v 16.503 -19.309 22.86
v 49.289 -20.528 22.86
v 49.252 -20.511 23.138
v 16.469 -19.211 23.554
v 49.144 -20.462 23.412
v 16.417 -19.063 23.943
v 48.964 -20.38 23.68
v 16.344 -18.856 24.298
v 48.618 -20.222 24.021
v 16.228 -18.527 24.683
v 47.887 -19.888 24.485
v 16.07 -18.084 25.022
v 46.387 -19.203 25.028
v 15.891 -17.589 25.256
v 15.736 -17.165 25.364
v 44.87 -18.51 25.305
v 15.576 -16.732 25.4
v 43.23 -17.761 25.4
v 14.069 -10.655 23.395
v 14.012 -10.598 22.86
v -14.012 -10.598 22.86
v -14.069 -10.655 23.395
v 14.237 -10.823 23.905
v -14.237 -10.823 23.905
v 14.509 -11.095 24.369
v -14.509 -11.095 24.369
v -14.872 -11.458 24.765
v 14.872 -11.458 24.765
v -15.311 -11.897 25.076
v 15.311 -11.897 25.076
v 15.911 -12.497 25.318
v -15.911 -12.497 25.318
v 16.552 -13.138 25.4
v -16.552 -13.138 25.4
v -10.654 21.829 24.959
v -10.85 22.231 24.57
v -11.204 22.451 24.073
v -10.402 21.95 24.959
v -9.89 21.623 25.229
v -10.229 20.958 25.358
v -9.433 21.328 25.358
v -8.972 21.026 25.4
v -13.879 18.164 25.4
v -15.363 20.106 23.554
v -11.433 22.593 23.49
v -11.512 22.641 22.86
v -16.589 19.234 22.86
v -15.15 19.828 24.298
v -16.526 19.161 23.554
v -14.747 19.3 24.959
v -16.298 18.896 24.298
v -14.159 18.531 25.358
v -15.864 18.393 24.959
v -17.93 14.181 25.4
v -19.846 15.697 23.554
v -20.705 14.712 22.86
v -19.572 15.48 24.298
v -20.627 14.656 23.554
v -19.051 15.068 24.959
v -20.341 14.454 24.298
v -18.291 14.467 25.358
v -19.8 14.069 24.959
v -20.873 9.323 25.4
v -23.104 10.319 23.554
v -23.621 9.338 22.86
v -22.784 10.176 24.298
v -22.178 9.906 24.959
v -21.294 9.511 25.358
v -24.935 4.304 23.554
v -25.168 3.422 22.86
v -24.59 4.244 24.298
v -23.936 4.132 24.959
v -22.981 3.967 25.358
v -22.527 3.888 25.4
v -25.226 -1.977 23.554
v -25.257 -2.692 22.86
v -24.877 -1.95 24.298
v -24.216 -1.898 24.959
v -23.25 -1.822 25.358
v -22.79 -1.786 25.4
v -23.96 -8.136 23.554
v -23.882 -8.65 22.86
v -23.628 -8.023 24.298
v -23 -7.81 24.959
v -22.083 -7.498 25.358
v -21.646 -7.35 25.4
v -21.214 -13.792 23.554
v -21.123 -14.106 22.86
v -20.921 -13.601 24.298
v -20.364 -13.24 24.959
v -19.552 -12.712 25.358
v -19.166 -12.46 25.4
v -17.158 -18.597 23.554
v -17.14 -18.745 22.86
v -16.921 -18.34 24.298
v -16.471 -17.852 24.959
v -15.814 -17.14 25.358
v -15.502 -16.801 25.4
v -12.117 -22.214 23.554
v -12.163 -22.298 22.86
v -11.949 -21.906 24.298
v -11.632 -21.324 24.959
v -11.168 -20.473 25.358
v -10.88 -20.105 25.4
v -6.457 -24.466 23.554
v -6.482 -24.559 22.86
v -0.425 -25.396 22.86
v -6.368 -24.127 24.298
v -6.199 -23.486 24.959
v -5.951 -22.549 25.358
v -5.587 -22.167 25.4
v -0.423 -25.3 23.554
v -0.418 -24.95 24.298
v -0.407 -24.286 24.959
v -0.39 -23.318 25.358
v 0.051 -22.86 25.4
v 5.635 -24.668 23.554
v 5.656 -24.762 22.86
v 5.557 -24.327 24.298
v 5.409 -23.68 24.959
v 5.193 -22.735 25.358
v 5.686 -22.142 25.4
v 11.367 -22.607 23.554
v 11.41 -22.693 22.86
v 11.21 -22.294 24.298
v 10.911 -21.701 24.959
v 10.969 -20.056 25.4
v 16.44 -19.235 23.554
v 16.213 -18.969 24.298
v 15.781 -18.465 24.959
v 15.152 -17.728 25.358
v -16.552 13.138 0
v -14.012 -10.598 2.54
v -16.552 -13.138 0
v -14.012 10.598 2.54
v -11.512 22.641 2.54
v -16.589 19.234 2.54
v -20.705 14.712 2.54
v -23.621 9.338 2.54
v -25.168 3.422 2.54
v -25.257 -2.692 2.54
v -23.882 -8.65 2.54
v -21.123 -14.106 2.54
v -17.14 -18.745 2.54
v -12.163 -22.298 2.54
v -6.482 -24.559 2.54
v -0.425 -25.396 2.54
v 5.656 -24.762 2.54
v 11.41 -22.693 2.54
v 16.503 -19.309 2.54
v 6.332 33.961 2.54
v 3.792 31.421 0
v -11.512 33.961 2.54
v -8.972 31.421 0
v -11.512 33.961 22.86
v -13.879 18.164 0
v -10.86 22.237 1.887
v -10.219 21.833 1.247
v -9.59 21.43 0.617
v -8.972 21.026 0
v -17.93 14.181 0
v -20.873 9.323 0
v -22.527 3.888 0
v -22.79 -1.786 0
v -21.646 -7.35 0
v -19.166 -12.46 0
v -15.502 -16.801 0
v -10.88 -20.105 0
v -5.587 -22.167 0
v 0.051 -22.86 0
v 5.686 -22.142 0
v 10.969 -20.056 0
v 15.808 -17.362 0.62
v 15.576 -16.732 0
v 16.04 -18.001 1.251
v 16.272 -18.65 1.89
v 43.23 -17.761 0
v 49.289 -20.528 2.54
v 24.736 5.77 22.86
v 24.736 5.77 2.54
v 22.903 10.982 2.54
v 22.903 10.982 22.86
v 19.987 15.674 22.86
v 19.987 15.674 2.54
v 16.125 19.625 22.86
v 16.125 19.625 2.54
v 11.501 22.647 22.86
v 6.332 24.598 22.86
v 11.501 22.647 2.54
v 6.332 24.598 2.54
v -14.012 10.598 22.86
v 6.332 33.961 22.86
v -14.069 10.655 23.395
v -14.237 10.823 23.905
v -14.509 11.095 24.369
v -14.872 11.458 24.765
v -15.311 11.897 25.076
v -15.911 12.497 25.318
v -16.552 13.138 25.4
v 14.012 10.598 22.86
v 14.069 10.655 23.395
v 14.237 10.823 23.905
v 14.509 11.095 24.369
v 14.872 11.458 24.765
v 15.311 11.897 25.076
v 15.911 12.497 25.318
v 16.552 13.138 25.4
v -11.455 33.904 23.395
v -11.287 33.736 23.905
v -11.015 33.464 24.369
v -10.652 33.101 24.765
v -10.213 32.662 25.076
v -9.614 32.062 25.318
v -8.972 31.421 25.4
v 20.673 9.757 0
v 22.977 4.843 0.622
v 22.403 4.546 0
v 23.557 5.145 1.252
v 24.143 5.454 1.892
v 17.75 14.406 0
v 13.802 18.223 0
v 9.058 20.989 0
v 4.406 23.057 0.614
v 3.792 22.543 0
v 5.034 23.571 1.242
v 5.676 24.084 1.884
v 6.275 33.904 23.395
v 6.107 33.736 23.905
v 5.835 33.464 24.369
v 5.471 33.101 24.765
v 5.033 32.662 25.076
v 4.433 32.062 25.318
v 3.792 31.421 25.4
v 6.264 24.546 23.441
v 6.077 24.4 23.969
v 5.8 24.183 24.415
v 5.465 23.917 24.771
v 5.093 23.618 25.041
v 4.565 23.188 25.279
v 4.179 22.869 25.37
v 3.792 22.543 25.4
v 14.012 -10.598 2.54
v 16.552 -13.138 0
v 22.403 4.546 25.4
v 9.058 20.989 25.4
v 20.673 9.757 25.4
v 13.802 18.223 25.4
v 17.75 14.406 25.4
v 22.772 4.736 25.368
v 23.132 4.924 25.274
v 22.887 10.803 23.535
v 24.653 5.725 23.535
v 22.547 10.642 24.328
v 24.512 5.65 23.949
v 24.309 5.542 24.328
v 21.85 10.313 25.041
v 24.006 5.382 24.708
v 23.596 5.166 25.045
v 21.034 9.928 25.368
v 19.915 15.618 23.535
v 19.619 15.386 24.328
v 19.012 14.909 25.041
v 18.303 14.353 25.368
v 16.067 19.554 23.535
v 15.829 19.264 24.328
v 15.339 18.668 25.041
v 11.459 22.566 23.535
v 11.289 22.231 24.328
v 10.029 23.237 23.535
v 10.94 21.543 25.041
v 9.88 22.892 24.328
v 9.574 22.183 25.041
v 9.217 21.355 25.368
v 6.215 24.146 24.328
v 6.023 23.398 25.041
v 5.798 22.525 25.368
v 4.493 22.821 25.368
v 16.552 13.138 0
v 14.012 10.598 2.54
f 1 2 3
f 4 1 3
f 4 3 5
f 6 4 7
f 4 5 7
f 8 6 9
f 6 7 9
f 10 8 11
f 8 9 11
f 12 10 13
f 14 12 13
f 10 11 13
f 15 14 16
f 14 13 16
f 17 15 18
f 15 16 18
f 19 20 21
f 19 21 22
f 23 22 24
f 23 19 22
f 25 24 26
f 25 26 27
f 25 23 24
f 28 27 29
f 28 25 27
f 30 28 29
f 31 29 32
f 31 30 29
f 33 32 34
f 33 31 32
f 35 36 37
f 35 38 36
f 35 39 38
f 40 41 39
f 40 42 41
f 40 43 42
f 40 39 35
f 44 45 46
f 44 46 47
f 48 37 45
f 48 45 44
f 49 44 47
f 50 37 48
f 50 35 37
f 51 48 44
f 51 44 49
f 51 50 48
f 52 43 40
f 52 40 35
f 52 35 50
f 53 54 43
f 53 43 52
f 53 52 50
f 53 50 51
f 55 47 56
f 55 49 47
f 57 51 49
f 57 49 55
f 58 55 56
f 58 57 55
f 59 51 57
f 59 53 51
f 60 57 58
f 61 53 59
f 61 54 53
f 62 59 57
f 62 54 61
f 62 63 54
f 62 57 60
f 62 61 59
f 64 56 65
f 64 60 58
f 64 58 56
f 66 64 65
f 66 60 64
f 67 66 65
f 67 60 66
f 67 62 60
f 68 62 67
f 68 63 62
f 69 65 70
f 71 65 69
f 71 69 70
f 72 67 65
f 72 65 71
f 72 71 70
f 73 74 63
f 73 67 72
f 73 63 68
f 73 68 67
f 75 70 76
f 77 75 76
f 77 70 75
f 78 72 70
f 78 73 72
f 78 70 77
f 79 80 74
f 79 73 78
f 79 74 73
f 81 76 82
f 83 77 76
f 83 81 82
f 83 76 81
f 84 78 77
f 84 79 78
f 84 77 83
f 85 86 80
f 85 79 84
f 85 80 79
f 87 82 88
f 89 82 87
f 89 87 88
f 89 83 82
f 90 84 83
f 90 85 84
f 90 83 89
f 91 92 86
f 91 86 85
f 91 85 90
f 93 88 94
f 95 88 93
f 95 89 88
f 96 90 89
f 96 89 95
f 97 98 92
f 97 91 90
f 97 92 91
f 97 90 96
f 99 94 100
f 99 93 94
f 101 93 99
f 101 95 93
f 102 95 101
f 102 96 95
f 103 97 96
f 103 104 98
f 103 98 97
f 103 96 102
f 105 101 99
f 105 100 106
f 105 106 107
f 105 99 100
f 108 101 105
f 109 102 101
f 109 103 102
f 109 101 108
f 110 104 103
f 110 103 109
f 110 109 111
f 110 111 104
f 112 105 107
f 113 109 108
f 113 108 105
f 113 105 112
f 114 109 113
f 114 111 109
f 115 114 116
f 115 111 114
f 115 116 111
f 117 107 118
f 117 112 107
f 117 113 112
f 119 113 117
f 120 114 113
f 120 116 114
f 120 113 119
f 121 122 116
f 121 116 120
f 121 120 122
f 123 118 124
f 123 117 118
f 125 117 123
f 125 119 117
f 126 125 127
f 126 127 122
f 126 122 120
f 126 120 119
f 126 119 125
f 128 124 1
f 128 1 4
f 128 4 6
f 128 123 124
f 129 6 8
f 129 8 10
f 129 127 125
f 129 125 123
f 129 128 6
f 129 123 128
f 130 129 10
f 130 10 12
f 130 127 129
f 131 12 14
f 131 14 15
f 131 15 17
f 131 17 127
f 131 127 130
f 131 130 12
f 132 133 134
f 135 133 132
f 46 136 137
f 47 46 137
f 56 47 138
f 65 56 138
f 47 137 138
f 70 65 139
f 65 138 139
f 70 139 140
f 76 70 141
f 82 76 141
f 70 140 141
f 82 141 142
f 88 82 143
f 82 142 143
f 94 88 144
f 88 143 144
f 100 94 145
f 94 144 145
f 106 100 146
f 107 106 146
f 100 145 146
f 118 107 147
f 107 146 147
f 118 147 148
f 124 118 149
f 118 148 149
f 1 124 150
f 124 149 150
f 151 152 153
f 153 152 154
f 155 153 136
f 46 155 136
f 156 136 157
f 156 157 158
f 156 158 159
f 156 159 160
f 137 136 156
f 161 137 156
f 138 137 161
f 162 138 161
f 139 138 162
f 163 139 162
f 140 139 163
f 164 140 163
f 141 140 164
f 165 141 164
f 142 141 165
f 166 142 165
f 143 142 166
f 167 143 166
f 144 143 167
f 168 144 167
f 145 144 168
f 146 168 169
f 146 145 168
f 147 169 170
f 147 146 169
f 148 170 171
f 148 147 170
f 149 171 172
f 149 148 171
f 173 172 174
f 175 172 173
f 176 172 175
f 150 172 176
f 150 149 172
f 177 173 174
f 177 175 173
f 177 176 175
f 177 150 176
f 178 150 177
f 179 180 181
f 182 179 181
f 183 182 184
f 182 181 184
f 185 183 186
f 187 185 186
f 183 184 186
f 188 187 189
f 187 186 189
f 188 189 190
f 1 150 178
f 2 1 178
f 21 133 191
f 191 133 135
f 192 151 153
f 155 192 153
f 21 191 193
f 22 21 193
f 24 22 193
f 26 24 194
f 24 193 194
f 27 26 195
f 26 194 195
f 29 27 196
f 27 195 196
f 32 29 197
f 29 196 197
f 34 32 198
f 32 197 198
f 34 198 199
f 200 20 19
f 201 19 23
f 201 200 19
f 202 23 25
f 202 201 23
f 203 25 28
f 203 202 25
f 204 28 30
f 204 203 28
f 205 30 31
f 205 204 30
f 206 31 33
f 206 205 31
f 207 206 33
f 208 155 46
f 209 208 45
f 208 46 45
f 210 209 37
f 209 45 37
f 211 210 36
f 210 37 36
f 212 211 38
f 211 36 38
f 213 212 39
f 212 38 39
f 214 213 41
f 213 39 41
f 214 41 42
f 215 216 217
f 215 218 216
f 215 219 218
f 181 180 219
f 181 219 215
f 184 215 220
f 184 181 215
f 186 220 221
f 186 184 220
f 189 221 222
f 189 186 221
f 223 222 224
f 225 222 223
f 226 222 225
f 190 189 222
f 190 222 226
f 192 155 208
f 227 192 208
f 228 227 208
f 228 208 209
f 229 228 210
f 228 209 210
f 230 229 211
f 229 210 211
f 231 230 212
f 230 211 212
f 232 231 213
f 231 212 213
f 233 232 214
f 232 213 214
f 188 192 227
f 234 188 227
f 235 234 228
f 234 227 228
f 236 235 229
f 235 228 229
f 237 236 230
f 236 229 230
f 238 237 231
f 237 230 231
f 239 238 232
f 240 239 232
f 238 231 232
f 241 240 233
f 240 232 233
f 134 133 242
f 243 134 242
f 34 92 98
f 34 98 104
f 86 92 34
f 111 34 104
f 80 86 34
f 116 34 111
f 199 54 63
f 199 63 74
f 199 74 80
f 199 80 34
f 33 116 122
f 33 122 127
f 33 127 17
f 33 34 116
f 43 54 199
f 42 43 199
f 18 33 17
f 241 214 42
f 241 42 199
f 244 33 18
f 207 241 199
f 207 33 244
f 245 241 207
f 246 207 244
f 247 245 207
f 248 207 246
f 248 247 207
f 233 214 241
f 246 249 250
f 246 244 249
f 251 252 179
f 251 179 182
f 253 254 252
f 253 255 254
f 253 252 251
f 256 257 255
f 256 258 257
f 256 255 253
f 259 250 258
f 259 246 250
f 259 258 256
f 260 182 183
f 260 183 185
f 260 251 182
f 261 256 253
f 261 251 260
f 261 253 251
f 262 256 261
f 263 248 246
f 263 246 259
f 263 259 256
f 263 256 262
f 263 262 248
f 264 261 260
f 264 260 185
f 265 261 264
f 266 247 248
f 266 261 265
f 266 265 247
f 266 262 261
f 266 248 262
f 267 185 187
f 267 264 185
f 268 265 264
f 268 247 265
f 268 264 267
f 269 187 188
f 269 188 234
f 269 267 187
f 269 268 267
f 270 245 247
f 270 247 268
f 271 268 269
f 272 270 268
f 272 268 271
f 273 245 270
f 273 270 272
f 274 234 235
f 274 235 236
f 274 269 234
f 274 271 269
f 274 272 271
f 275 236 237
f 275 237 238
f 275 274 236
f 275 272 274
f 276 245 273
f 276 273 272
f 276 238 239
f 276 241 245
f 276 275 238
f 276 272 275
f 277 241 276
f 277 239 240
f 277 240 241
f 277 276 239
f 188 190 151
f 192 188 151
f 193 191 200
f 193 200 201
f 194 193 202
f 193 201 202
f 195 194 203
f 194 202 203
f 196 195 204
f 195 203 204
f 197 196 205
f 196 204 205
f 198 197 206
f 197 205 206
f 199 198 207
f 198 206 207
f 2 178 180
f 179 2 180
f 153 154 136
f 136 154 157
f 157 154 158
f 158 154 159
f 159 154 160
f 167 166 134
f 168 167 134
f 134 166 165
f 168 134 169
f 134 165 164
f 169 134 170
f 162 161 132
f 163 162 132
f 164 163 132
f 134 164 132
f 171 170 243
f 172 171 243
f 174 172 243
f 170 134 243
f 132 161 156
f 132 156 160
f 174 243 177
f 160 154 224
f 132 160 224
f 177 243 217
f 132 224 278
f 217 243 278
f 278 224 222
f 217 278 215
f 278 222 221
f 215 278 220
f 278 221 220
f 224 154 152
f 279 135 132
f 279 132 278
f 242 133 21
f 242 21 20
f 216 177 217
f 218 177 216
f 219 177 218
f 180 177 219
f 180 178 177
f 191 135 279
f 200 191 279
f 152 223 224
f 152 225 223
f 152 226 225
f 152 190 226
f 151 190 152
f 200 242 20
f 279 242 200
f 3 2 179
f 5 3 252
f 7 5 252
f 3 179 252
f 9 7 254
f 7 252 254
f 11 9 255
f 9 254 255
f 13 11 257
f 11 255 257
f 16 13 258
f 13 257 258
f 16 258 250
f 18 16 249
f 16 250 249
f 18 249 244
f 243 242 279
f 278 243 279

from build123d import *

# Parameters (mm, degrees)
F0_W     = 28.024344
F0_H     = 21.196416
F1_DEPTH = 25.4
F2_R     = 2.54
F3_SIZE  = 2.54


with BuildPart() as f1:
    # F0 (on Top) → F1 (new body)
    with BuildSketch(Plane.XY):
        with BuildLine():
            Line((-11.51223, 33.96108), (-11.51223, 22.641302))
            ThreePointArc((-11.51223, 22.641302), (-21.122827, -14.106246), (16.502721, -19.308552))
            Line((16.502721, -19.308552), (49.288545, -20.528002))
            Line((49.288545, -20.528002), (24.736057, 5.76953))
            ThreePointArc((24.736057, 5.76953), (18.164005, 17.754687), (6.331727, 24.598155))
            Line((6.331727, 24.598155), (6.331727, 33.96108))
            Line((6.331727, 33.96108), (-11.51223, 33.96108))
        make_face()
        Rectangle(F0_W, F0_H, mode=Mode.SUBTRACT)
    extrude(amount=F1_DEPTH)

    # F2
    f2_edges = [f1.edges().sort_by_distance(p)[0] for p in [
        (18.164005, 17.754687, 25.4),
        (6.331727, 29.279618, 25.4),
        (-2.590252, 33.96108, 25.4),
        (-11.51223, 28.301191, 25.4),
        (-21.122827, -14.106246, 25.4),
        (32.895633, -19.918277, 25.4),
        (37.012301, -7.379236, 25.4),
        (0, 10.598208, 25.4),
        (14.012172, 0, 25.4),
        (0, -10.598208, 25.4),
        (-14.012172, 0, 25.4),
    ]]
    fillet(f2_edges, radius=F2_R)

    # F3
    f3_edges = [f1.edges().sort_by_distance(p)[0] for p in [
        (18.164005, 17.754687, 0),
        (6.331727, 29.279618, 0),
        (-2.590252, 33.96108, 0),
        (-11.51223, 28.301191, 0),
        (-21.122827, -14.106246, 0),
        (32.895633, -19.918277, 0),
        (37.012301, -7.379236, 0),
        (0, 10.598208, 0),
        (14.012172, 0, 0),
        (0, -10.598208, 0),
        (-14.012172, 0, 0),
    ]]
    chamfer(f3_edges, length=F3_SIZE)


solid = f1.part
